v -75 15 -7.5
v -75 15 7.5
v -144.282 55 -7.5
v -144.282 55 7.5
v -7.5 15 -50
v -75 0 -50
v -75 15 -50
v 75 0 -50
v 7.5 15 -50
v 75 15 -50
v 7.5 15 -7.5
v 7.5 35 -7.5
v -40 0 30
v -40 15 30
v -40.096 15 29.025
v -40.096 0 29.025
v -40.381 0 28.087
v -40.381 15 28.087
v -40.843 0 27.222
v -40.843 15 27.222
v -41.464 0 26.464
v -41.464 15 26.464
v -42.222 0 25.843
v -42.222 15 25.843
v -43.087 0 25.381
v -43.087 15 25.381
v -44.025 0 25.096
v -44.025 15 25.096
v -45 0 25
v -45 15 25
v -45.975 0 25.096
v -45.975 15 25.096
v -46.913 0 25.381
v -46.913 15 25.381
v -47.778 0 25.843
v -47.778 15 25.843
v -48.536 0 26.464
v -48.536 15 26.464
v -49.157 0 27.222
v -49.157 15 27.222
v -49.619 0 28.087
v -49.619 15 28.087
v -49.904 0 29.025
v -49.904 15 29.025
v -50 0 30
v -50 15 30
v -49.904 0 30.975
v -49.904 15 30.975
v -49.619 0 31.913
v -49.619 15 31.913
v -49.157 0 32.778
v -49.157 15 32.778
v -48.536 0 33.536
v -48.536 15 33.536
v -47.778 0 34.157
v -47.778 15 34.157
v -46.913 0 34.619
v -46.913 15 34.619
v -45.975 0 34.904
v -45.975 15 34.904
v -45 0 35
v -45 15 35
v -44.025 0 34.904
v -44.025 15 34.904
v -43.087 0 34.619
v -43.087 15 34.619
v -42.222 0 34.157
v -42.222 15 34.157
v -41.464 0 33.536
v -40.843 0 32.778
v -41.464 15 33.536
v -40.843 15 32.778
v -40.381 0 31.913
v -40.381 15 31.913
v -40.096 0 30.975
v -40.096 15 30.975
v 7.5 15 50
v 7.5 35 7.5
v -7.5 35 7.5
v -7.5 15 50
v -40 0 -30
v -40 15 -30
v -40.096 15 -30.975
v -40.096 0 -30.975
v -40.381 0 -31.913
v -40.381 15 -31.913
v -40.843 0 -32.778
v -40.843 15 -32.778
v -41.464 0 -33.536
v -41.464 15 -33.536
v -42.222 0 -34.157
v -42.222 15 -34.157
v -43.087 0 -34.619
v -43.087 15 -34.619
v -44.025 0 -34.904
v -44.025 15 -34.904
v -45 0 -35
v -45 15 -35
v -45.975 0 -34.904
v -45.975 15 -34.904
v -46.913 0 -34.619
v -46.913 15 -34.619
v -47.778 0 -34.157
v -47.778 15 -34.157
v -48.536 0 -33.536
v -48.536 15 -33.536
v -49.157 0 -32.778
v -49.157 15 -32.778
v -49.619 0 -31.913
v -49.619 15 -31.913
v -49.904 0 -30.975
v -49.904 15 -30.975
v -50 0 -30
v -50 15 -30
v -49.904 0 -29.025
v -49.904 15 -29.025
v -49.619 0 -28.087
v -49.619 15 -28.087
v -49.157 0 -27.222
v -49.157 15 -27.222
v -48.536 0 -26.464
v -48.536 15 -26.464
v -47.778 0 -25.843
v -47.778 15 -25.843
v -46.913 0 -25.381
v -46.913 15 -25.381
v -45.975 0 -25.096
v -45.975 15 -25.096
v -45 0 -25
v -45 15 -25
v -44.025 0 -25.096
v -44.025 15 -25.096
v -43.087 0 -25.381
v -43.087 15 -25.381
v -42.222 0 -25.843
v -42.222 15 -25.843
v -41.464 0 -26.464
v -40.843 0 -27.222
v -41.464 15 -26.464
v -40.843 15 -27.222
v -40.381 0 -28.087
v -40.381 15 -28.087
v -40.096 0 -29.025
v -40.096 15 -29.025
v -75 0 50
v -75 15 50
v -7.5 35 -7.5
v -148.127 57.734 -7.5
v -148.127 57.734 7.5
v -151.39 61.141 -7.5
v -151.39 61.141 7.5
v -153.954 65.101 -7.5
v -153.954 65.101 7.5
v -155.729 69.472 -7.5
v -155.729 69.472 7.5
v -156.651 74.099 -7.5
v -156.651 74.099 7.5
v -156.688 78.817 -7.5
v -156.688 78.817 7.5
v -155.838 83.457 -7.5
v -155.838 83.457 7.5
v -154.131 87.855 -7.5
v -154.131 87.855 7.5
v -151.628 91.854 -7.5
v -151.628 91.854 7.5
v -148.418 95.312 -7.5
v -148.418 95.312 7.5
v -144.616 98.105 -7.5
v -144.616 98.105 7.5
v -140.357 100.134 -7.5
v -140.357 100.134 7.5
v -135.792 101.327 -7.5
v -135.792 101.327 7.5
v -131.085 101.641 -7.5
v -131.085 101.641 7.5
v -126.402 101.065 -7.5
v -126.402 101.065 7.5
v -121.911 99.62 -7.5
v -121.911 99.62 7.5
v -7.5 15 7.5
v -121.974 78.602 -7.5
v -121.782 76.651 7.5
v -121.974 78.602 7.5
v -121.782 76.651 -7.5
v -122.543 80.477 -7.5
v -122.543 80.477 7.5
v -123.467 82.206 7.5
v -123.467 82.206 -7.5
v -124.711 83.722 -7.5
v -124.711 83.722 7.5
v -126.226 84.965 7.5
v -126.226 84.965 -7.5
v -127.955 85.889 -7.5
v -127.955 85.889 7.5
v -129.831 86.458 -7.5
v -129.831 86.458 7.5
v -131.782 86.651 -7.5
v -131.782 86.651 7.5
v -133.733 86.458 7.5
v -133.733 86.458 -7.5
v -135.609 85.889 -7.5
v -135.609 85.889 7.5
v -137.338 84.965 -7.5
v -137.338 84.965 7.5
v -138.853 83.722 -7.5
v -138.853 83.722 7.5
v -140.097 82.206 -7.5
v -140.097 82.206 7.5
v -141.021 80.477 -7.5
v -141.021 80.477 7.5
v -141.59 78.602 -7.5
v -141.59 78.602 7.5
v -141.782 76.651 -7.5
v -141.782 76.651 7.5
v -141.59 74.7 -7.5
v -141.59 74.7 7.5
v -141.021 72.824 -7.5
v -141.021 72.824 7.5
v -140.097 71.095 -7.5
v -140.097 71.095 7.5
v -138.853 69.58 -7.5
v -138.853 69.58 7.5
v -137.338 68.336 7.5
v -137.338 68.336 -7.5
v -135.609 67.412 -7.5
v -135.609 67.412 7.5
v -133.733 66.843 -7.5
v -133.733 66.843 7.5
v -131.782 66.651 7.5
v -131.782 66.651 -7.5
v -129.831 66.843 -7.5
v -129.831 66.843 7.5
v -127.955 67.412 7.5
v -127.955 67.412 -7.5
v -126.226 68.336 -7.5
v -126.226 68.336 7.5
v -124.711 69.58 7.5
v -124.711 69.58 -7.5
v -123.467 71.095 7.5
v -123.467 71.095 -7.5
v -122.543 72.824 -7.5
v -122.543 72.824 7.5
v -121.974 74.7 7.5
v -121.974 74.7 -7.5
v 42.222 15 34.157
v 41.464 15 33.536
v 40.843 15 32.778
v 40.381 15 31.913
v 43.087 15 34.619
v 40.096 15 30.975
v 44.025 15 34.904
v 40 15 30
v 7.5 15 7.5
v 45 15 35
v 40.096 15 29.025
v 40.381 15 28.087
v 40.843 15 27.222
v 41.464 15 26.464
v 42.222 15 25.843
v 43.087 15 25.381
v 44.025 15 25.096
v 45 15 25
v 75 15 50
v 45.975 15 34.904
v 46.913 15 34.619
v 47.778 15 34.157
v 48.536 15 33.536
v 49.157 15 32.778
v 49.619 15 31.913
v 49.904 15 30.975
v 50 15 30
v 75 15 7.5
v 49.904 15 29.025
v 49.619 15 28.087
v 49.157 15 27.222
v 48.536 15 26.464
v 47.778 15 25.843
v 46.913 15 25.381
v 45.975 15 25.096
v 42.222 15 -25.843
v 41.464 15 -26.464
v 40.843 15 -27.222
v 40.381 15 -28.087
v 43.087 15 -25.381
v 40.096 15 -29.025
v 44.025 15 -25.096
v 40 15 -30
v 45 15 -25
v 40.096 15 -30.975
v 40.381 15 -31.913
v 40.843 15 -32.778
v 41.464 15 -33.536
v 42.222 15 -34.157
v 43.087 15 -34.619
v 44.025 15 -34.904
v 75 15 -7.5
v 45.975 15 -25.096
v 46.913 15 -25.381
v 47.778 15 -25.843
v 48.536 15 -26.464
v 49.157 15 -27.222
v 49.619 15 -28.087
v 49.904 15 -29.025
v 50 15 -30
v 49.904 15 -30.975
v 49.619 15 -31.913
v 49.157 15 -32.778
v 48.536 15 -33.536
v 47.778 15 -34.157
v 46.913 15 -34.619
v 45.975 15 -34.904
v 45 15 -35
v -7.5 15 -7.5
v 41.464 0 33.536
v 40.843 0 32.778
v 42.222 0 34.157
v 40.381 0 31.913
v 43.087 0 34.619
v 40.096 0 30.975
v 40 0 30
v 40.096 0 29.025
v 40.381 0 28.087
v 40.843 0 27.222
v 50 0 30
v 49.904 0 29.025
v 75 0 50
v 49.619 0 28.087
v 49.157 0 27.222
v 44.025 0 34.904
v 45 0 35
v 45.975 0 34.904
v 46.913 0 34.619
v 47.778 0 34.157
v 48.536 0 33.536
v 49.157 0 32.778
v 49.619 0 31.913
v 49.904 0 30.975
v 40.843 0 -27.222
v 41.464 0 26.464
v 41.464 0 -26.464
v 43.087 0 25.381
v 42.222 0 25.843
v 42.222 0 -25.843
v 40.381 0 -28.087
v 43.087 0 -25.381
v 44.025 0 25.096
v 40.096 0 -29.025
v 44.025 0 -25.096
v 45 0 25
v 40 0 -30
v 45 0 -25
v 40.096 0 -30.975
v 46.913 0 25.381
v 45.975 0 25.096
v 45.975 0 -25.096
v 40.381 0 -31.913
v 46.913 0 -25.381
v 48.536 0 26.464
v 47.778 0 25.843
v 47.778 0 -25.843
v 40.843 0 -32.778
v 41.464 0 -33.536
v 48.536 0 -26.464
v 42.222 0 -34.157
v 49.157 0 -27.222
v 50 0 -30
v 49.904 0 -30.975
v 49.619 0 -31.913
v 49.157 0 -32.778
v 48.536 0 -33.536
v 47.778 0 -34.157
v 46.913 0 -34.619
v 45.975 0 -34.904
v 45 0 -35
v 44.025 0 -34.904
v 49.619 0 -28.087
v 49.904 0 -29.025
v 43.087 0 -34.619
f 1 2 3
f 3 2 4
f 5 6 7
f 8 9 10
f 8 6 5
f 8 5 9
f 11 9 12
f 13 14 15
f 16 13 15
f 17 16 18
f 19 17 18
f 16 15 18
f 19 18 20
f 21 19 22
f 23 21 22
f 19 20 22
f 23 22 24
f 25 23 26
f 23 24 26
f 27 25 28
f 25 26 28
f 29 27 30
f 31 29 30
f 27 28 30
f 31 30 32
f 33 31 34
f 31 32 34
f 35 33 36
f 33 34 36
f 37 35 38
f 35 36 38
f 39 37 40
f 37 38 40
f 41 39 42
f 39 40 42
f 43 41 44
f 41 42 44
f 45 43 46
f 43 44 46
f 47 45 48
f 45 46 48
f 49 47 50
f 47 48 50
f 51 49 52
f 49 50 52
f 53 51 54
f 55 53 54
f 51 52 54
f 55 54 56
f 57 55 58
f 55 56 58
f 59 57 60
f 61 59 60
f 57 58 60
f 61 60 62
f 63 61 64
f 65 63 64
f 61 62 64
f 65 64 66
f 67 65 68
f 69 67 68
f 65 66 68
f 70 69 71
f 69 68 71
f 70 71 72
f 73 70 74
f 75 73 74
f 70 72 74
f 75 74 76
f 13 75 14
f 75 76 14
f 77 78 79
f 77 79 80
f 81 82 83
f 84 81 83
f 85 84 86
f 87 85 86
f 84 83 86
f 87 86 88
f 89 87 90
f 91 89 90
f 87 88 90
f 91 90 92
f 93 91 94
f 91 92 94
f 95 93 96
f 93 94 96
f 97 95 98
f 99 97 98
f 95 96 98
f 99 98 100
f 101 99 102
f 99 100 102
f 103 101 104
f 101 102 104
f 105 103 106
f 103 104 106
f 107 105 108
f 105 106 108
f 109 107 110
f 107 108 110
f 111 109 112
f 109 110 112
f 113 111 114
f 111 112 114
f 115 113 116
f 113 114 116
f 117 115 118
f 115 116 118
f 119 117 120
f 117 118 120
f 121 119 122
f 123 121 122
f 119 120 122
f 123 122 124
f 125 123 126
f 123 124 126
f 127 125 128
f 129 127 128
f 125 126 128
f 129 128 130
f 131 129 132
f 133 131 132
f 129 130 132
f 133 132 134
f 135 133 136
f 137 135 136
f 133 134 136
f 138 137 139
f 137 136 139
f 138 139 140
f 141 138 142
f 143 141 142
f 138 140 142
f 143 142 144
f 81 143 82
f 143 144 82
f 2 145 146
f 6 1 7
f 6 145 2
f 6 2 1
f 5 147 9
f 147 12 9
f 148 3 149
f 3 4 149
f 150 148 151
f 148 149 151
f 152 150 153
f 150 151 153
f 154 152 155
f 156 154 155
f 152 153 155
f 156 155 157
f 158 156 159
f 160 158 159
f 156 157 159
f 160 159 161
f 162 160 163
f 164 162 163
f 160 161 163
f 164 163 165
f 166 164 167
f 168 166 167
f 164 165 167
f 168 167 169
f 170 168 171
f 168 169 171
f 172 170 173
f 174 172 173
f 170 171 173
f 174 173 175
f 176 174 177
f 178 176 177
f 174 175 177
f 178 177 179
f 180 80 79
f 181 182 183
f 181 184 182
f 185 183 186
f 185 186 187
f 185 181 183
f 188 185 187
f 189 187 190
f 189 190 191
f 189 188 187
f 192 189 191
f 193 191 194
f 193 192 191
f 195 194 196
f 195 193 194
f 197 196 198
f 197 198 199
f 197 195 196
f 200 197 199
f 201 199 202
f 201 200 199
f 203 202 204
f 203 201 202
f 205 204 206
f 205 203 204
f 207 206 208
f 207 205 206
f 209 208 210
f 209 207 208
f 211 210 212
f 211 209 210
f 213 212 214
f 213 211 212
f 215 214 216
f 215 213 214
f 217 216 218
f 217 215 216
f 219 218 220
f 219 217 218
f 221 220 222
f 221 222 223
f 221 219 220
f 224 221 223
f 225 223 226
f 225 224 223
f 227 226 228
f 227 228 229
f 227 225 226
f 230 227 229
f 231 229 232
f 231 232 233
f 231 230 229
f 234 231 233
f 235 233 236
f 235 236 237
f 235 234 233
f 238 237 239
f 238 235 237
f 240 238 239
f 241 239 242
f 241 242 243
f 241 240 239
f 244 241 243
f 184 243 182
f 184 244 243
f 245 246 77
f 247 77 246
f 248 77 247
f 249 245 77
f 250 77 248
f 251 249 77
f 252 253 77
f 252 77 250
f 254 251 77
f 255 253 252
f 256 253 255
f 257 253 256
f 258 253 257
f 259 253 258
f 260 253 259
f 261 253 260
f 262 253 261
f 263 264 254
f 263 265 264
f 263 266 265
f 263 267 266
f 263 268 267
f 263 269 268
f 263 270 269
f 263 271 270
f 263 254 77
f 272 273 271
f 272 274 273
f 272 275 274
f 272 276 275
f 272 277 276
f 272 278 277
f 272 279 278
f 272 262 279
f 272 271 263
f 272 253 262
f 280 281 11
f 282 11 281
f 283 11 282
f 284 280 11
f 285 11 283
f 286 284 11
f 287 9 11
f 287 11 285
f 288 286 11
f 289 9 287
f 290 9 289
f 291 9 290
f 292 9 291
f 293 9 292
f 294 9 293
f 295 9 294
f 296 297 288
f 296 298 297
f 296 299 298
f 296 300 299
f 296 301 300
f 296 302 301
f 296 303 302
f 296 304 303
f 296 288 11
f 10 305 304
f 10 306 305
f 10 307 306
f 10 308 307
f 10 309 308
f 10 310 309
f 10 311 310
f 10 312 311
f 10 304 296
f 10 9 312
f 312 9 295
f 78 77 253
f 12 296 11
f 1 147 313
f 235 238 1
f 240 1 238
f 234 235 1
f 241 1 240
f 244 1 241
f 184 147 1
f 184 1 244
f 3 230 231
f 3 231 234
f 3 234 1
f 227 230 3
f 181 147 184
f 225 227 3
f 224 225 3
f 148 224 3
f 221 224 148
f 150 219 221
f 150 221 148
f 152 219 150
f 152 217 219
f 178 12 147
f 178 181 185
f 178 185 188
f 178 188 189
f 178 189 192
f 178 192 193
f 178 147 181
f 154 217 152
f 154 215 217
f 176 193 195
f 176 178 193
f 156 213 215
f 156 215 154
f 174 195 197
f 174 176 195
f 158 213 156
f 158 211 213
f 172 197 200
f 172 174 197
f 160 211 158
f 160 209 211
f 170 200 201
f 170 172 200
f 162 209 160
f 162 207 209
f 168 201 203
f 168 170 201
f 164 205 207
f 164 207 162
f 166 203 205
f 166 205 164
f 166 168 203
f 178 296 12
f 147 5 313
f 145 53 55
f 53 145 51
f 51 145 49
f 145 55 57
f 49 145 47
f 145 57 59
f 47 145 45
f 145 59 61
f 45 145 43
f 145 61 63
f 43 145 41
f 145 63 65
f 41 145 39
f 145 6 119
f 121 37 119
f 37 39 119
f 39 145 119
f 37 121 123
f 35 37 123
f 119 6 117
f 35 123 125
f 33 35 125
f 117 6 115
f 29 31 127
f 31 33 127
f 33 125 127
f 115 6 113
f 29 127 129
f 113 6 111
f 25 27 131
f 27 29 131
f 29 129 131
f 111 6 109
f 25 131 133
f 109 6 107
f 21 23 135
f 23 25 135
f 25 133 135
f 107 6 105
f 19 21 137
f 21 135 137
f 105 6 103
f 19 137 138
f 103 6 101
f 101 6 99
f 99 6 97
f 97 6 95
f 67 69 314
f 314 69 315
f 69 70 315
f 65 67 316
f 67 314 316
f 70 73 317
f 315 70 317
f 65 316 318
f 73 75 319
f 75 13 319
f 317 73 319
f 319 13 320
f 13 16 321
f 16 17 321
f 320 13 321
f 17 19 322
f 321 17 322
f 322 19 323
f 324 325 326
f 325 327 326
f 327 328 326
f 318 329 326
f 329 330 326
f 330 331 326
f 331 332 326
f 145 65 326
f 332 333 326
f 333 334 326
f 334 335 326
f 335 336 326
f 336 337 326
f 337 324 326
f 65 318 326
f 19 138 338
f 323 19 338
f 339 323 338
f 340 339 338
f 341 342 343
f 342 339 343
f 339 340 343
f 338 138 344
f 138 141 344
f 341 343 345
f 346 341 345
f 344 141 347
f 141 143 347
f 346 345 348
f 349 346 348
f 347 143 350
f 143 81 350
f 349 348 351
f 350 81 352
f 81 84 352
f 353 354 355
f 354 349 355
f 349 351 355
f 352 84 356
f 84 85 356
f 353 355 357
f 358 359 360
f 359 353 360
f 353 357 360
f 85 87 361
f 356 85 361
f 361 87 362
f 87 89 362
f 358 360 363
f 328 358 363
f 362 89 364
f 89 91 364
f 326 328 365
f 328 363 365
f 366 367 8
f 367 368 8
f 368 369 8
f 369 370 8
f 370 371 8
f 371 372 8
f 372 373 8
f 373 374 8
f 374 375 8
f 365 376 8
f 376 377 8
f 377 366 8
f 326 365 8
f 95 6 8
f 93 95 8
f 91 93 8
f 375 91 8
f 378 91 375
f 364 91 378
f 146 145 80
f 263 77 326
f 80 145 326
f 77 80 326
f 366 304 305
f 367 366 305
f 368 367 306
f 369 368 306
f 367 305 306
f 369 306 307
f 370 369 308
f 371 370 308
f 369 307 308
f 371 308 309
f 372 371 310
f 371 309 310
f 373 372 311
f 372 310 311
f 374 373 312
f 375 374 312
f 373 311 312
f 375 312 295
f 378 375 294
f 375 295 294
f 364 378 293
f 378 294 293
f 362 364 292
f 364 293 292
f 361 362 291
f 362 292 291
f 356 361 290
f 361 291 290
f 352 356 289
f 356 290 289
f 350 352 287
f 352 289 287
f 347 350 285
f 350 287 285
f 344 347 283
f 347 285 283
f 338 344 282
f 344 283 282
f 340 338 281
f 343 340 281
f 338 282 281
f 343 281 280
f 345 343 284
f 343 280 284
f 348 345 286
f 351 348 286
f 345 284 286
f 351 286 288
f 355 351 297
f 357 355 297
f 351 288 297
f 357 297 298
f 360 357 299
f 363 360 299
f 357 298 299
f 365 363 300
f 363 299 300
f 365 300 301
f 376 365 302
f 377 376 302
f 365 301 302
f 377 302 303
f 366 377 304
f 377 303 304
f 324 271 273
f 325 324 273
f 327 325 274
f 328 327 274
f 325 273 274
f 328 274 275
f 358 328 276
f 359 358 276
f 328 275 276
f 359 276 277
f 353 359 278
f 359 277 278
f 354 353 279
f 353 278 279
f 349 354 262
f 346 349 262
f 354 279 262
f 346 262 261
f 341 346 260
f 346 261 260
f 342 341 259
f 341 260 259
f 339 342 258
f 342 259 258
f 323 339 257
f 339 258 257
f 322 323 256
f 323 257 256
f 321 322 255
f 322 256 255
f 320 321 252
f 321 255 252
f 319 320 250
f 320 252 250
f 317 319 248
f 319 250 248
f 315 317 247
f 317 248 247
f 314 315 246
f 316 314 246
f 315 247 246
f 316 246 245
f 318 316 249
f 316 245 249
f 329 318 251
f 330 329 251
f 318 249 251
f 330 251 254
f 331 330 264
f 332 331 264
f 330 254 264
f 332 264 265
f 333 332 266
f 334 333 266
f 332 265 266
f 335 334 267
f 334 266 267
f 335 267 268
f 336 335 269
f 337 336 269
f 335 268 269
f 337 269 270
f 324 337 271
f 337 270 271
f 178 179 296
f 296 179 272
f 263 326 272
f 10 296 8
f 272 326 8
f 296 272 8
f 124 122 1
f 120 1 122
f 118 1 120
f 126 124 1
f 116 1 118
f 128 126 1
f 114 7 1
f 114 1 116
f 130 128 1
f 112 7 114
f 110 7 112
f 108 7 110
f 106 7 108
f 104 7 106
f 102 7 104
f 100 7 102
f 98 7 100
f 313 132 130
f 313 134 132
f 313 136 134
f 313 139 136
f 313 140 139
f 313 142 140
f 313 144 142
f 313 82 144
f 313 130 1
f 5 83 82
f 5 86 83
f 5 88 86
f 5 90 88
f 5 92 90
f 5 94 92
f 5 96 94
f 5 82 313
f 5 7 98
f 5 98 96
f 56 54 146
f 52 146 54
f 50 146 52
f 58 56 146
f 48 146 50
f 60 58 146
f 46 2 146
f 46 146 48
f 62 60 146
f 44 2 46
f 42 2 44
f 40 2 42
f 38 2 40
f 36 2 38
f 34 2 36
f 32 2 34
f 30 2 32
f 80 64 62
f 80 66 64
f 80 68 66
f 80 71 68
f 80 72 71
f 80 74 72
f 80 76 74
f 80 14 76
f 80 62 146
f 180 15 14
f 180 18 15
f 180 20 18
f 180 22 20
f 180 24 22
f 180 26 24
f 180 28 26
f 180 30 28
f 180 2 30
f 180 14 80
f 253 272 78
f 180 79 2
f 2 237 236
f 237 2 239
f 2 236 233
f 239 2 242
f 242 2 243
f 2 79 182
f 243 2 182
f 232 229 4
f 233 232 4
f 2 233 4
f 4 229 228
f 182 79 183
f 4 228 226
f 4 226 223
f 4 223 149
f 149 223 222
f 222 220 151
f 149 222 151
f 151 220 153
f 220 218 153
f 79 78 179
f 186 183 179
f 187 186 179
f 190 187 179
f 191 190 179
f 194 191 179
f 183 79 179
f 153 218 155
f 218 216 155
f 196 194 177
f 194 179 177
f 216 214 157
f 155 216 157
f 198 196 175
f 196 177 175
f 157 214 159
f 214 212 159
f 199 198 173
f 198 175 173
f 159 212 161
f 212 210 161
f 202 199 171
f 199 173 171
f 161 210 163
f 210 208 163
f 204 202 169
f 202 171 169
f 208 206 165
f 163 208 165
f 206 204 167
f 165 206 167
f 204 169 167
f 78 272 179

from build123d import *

# Parameters (mm, degrees)
SKETCH1_W           = 150
SKETCH1_H           = 100
BOSS_EXTRUDE1_DEPTH = 15
SKETCH2_R           = 5
CUT_EXTRUDE2_DEPTH  = 15
SKETCH4_R           = 10
BOSS_EXTRUDE3_DEPTH = 7.5
BOSS_EXTRUDE4_DEPTH = 7.5
BOSS_EXTRUDE5_DEPTH = 7.5


with BuildPart() as part:
    # Sketch1 → Boss-Extrude1 (new body)
    with BuildSketch(Plane(origin=(0, 0, 0), x_dir=(1, 0, 0), z_dir=(0, 1, 0))):
        Rectangle(SKETCH1_W, SKETCH1_H)
    extrude(amount=BOSS_EXTRUDE1_DEPTH)

    # Sketch2 → Cut-Extrude2 (cut)
    with BuildSketch(Plane(origin=(0, 15, 0), x_dir=(1, 0, 0), z_dir=(0, 1, 0))):
        with Locations((45, -30)):
            Circle(SKETCH2_R)
        with Locations((45, 30)):
            Circle(SKETCH2_R)
        with Locations((-45, 30)):
            Circle(SKETCH2_R)
        with Locations((-45, -30)):
            Circle(SKETCH2_R)
    extrude(amount=-CUT_EXTRUDE2_DEPTH, mode=Mode.SUBTRACT)

    # Sketch4 → Boss-Extrude3 (add, symmetric)
    with BuildSketch(Plane.XY):
        with BuildLine():
            Line((75, 15), (-75, 15))
            Line((-75, 15), (-144.282032303, 55))
            ThreePointArc((-144.282032303, 55), (-154.13052805, 87.855309915), (-121.911493446, 99.61958071))
            Line((-121.911493446, 99.61958071), (75, 15))
        make_face()
        with Locations((-131.782032303, 76.650635095)):
            Circle(SKETCH4_R, mode=Mode.SUBTRACT)
    extrude(amount=BOSS_EXTRUDE3_DEPTH, both=True)

    # Sketch5 → Boss-Extrude4 (add, symmetric)
    with BuildSketch(Plane(origin=(0, 0, 0), x_dir=(0, 0, -1), z_dir=(1, 0, 0))):
        Polygon((-7.5, 15), (-7.5, 35), (-50, 15), align=None)
    extrude(amount=BOSS_EXTRUDE4_DEPTH, both=True)

    # Sketch6 → Boss-Extrude5 (add, symmetric)
    with BuildSketch(Plane(origin=(0, 0, 0), x_dir=(0, 0, -1), z_dir=(1, 0, 0))):
        Polygon((7.5, 15), (7.5, 35), (50, 15), align=None)
    extrude(amount=BOSS_EXTRUDE5_DEPTH, both=True)


solid = part.part
